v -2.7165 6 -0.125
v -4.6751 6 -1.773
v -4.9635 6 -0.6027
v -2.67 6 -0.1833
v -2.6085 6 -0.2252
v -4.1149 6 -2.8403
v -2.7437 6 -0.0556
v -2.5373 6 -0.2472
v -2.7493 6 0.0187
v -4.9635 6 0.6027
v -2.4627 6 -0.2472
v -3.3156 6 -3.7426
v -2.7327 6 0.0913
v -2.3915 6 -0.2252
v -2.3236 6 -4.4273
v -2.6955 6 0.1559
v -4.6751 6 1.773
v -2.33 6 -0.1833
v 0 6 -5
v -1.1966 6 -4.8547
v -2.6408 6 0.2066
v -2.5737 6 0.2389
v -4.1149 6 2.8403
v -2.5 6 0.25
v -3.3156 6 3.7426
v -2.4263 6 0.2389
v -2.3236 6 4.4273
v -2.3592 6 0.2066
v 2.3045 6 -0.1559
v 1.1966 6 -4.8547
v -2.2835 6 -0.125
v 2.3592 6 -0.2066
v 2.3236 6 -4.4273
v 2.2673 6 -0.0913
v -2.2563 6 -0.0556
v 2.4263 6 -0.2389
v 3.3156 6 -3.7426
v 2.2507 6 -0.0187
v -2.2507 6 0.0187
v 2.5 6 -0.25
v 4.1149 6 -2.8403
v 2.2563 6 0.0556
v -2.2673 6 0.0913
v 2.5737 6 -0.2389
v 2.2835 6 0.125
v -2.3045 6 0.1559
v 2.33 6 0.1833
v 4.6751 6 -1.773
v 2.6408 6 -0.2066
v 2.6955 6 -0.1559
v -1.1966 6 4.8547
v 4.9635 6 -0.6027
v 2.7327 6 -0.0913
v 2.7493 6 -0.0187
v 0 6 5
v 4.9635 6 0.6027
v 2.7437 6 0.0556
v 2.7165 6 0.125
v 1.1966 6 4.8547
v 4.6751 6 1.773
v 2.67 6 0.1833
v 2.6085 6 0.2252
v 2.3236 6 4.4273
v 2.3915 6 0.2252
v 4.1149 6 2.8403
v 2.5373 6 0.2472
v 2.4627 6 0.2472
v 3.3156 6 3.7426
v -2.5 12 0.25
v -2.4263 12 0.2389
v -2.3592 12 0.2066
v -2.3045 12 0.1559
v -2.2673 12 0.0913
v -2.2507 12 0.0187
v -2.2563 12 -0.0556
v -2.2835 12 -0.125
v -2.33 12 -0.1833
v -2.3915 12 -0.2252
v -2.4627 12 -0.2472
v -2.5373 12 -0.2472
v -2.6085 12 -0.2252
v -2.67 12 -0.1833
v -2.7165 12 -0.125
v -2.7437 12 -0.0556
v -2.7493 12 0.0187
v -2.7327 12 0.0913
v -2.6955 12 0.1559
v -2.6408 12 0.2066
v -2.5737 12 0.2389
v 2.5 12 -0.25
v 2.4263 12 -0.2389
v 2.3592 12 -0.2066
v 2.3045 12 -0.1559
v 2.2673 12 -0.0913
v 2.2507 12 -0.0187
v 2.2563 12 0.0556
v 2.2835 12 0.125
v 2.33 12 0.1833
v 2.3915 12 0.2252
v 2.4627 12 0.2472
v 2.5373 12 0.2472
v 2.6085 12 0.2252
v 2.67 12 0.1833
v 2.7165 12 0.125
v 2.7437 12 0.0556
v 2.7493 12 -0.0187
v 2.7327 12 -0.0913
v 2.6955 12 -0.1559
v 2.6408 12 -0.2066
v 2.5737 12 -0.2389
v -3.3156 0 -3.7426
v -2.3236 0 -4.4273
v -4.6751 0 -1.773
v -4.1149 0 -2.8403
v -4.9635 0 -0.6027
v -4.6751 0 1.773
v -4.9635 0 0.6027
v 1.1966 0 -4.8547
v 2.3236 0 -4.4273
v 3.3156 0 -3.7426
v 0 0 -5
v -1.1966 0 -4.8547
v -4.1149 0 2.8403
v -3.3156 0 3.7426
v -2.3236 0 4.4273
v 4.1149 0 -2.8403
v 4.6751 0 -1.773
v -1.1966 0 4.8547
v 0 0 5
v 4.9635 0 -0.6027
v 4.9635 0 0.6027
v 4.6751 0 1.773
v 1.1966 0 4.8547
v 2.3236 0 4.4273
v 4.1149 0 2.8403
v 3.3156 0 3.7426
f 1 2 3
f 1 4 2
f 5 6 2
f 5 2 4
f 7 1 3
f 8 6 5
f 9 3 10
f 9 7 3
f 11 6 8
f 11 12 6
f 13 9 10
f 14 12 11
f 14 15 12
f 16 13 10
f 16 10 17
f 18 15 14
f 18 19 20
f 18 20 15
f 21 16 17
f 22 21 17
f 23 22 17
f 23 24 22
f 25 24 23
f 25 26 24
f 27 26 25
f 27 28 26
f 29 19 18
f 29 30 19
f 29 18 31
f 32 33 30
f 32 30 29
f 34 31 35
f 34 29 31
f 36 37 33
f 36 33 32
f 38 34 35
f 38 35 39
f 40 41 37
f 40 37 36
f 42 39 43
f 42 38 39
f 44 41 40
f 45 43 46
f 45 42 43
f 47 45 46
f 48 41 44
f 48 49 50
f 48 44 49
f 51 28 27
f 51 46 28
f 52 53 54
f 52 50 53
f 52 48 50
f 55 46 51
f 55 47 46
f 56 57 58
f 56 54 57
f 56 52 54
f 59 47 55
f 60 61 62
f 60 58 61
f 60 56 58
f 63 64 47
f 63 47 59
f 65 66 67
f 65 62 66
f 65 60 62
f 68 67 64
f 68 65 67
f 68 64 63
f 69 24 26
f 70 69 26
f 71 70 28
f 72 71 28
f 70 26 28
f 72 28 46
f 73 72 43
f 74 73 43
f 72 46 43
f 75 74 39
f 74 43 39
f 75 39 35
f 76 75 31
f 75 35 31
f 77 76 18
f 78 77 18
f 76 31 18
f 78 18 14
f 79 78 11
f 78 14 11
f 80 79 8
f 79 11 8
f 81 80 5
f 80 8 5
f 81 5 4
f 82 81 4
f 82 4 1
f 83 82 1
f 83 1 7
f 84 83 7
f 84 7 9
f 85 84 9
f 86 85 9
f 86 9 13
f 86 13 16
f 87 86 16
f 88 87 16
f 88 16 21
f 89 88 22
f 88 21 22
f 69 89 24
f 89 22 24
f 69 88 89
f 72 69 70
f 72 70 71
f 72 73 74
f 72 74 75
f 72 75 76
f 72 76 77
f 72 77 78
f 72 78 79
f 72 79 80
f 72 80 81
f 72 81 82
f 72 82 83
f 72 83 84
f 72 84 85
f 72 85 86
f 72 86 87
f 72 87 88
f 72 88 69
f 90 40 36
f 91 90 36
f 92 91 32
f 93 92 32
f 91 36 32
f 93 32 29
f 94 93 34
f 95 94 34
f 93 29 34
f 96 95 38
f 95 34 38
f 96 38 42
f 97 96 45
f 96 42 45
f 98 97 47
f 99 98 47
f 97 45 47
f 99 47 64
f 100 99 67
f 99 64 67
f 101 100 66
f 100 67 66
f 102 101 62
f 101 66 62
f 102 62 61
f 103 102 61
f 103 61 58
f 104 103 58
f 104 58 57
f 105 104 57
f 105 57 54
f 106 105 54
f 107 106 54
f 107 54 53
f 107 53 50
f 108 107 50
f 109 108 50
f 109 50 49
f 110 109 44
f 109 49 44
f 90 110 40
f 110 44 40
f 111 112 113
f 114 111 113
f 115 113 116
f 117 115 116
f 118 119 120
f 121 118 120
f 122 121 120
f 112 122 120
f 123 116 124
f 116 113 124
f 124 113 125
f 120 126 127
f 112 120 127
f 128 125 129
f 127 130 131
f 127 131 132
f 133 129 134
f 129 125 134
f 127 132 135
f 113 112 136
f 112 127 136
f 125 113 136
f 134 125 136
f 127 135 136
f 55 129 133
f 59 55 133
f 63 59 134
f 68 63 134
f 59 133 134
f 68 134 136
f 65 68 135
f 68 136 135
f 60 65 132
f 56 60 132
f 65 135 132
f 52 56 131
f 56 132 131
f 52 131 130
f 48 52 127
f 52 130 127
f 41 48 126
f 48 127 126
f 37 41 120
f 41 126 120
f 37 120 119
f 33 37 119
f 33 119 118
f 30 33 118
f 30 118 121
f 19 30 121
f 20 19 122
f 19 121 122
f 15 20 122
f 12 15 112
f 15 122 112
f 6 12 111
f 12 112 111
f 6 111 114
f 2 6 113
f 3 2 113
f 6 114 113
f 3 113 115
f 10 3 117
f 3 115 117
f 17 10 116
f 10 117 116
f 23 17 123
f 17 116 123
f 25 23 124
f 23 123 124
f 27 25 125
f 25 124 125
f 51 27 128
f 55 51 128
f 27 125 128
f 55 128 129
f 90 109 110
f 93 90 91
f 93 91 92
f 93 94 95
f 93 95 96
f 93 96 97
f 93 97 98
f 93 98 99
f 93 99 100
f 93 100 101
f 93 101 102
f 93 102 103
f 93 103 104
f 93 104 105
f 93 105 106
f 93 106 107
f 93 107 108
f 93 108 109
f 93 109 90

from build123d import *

# Parameters (mm, degrees)
SKETCH_1_R      = 5
EXTRUDE_1_DEPTH = 6
SKETCH_2_R      = 0.25
EXTRUDE_2_DEPTH = 6


with BuildPart() as part:
    # Эскиз1 → Бобышка-Вытянуть1 (new body)
    with BuildSketch(Plane(origin=(0, 0, 0), x_dir=(1, 0, 0), z_dir=(0, 1, 0))):
        with Locations(Location((0, 0, 0), (0, 0, 270))):
            Circle(SKETCH_1_R)
    extrude(amount=EXTRUDE_1_DEPTH)

    # Эскиз2 → Бобышка-Вытянуть2 (add)
    with BuildSketch(Plane(origin=(0, 6, 0), x_dir=(1, 0, 0), z_dir=(0, 1, 0))):
        with Locations(Location((-2.5, 0, 0), (0, 0, 270))):
            Circle(SKETCH_2_R)
        with Locations(Location((2.5, 0, 0), (0, 0, 90))):
            Circle(SKETCH_2_R)
    extrude(amount=EXTRUDE_2_DEPTH)


solid = part.part
